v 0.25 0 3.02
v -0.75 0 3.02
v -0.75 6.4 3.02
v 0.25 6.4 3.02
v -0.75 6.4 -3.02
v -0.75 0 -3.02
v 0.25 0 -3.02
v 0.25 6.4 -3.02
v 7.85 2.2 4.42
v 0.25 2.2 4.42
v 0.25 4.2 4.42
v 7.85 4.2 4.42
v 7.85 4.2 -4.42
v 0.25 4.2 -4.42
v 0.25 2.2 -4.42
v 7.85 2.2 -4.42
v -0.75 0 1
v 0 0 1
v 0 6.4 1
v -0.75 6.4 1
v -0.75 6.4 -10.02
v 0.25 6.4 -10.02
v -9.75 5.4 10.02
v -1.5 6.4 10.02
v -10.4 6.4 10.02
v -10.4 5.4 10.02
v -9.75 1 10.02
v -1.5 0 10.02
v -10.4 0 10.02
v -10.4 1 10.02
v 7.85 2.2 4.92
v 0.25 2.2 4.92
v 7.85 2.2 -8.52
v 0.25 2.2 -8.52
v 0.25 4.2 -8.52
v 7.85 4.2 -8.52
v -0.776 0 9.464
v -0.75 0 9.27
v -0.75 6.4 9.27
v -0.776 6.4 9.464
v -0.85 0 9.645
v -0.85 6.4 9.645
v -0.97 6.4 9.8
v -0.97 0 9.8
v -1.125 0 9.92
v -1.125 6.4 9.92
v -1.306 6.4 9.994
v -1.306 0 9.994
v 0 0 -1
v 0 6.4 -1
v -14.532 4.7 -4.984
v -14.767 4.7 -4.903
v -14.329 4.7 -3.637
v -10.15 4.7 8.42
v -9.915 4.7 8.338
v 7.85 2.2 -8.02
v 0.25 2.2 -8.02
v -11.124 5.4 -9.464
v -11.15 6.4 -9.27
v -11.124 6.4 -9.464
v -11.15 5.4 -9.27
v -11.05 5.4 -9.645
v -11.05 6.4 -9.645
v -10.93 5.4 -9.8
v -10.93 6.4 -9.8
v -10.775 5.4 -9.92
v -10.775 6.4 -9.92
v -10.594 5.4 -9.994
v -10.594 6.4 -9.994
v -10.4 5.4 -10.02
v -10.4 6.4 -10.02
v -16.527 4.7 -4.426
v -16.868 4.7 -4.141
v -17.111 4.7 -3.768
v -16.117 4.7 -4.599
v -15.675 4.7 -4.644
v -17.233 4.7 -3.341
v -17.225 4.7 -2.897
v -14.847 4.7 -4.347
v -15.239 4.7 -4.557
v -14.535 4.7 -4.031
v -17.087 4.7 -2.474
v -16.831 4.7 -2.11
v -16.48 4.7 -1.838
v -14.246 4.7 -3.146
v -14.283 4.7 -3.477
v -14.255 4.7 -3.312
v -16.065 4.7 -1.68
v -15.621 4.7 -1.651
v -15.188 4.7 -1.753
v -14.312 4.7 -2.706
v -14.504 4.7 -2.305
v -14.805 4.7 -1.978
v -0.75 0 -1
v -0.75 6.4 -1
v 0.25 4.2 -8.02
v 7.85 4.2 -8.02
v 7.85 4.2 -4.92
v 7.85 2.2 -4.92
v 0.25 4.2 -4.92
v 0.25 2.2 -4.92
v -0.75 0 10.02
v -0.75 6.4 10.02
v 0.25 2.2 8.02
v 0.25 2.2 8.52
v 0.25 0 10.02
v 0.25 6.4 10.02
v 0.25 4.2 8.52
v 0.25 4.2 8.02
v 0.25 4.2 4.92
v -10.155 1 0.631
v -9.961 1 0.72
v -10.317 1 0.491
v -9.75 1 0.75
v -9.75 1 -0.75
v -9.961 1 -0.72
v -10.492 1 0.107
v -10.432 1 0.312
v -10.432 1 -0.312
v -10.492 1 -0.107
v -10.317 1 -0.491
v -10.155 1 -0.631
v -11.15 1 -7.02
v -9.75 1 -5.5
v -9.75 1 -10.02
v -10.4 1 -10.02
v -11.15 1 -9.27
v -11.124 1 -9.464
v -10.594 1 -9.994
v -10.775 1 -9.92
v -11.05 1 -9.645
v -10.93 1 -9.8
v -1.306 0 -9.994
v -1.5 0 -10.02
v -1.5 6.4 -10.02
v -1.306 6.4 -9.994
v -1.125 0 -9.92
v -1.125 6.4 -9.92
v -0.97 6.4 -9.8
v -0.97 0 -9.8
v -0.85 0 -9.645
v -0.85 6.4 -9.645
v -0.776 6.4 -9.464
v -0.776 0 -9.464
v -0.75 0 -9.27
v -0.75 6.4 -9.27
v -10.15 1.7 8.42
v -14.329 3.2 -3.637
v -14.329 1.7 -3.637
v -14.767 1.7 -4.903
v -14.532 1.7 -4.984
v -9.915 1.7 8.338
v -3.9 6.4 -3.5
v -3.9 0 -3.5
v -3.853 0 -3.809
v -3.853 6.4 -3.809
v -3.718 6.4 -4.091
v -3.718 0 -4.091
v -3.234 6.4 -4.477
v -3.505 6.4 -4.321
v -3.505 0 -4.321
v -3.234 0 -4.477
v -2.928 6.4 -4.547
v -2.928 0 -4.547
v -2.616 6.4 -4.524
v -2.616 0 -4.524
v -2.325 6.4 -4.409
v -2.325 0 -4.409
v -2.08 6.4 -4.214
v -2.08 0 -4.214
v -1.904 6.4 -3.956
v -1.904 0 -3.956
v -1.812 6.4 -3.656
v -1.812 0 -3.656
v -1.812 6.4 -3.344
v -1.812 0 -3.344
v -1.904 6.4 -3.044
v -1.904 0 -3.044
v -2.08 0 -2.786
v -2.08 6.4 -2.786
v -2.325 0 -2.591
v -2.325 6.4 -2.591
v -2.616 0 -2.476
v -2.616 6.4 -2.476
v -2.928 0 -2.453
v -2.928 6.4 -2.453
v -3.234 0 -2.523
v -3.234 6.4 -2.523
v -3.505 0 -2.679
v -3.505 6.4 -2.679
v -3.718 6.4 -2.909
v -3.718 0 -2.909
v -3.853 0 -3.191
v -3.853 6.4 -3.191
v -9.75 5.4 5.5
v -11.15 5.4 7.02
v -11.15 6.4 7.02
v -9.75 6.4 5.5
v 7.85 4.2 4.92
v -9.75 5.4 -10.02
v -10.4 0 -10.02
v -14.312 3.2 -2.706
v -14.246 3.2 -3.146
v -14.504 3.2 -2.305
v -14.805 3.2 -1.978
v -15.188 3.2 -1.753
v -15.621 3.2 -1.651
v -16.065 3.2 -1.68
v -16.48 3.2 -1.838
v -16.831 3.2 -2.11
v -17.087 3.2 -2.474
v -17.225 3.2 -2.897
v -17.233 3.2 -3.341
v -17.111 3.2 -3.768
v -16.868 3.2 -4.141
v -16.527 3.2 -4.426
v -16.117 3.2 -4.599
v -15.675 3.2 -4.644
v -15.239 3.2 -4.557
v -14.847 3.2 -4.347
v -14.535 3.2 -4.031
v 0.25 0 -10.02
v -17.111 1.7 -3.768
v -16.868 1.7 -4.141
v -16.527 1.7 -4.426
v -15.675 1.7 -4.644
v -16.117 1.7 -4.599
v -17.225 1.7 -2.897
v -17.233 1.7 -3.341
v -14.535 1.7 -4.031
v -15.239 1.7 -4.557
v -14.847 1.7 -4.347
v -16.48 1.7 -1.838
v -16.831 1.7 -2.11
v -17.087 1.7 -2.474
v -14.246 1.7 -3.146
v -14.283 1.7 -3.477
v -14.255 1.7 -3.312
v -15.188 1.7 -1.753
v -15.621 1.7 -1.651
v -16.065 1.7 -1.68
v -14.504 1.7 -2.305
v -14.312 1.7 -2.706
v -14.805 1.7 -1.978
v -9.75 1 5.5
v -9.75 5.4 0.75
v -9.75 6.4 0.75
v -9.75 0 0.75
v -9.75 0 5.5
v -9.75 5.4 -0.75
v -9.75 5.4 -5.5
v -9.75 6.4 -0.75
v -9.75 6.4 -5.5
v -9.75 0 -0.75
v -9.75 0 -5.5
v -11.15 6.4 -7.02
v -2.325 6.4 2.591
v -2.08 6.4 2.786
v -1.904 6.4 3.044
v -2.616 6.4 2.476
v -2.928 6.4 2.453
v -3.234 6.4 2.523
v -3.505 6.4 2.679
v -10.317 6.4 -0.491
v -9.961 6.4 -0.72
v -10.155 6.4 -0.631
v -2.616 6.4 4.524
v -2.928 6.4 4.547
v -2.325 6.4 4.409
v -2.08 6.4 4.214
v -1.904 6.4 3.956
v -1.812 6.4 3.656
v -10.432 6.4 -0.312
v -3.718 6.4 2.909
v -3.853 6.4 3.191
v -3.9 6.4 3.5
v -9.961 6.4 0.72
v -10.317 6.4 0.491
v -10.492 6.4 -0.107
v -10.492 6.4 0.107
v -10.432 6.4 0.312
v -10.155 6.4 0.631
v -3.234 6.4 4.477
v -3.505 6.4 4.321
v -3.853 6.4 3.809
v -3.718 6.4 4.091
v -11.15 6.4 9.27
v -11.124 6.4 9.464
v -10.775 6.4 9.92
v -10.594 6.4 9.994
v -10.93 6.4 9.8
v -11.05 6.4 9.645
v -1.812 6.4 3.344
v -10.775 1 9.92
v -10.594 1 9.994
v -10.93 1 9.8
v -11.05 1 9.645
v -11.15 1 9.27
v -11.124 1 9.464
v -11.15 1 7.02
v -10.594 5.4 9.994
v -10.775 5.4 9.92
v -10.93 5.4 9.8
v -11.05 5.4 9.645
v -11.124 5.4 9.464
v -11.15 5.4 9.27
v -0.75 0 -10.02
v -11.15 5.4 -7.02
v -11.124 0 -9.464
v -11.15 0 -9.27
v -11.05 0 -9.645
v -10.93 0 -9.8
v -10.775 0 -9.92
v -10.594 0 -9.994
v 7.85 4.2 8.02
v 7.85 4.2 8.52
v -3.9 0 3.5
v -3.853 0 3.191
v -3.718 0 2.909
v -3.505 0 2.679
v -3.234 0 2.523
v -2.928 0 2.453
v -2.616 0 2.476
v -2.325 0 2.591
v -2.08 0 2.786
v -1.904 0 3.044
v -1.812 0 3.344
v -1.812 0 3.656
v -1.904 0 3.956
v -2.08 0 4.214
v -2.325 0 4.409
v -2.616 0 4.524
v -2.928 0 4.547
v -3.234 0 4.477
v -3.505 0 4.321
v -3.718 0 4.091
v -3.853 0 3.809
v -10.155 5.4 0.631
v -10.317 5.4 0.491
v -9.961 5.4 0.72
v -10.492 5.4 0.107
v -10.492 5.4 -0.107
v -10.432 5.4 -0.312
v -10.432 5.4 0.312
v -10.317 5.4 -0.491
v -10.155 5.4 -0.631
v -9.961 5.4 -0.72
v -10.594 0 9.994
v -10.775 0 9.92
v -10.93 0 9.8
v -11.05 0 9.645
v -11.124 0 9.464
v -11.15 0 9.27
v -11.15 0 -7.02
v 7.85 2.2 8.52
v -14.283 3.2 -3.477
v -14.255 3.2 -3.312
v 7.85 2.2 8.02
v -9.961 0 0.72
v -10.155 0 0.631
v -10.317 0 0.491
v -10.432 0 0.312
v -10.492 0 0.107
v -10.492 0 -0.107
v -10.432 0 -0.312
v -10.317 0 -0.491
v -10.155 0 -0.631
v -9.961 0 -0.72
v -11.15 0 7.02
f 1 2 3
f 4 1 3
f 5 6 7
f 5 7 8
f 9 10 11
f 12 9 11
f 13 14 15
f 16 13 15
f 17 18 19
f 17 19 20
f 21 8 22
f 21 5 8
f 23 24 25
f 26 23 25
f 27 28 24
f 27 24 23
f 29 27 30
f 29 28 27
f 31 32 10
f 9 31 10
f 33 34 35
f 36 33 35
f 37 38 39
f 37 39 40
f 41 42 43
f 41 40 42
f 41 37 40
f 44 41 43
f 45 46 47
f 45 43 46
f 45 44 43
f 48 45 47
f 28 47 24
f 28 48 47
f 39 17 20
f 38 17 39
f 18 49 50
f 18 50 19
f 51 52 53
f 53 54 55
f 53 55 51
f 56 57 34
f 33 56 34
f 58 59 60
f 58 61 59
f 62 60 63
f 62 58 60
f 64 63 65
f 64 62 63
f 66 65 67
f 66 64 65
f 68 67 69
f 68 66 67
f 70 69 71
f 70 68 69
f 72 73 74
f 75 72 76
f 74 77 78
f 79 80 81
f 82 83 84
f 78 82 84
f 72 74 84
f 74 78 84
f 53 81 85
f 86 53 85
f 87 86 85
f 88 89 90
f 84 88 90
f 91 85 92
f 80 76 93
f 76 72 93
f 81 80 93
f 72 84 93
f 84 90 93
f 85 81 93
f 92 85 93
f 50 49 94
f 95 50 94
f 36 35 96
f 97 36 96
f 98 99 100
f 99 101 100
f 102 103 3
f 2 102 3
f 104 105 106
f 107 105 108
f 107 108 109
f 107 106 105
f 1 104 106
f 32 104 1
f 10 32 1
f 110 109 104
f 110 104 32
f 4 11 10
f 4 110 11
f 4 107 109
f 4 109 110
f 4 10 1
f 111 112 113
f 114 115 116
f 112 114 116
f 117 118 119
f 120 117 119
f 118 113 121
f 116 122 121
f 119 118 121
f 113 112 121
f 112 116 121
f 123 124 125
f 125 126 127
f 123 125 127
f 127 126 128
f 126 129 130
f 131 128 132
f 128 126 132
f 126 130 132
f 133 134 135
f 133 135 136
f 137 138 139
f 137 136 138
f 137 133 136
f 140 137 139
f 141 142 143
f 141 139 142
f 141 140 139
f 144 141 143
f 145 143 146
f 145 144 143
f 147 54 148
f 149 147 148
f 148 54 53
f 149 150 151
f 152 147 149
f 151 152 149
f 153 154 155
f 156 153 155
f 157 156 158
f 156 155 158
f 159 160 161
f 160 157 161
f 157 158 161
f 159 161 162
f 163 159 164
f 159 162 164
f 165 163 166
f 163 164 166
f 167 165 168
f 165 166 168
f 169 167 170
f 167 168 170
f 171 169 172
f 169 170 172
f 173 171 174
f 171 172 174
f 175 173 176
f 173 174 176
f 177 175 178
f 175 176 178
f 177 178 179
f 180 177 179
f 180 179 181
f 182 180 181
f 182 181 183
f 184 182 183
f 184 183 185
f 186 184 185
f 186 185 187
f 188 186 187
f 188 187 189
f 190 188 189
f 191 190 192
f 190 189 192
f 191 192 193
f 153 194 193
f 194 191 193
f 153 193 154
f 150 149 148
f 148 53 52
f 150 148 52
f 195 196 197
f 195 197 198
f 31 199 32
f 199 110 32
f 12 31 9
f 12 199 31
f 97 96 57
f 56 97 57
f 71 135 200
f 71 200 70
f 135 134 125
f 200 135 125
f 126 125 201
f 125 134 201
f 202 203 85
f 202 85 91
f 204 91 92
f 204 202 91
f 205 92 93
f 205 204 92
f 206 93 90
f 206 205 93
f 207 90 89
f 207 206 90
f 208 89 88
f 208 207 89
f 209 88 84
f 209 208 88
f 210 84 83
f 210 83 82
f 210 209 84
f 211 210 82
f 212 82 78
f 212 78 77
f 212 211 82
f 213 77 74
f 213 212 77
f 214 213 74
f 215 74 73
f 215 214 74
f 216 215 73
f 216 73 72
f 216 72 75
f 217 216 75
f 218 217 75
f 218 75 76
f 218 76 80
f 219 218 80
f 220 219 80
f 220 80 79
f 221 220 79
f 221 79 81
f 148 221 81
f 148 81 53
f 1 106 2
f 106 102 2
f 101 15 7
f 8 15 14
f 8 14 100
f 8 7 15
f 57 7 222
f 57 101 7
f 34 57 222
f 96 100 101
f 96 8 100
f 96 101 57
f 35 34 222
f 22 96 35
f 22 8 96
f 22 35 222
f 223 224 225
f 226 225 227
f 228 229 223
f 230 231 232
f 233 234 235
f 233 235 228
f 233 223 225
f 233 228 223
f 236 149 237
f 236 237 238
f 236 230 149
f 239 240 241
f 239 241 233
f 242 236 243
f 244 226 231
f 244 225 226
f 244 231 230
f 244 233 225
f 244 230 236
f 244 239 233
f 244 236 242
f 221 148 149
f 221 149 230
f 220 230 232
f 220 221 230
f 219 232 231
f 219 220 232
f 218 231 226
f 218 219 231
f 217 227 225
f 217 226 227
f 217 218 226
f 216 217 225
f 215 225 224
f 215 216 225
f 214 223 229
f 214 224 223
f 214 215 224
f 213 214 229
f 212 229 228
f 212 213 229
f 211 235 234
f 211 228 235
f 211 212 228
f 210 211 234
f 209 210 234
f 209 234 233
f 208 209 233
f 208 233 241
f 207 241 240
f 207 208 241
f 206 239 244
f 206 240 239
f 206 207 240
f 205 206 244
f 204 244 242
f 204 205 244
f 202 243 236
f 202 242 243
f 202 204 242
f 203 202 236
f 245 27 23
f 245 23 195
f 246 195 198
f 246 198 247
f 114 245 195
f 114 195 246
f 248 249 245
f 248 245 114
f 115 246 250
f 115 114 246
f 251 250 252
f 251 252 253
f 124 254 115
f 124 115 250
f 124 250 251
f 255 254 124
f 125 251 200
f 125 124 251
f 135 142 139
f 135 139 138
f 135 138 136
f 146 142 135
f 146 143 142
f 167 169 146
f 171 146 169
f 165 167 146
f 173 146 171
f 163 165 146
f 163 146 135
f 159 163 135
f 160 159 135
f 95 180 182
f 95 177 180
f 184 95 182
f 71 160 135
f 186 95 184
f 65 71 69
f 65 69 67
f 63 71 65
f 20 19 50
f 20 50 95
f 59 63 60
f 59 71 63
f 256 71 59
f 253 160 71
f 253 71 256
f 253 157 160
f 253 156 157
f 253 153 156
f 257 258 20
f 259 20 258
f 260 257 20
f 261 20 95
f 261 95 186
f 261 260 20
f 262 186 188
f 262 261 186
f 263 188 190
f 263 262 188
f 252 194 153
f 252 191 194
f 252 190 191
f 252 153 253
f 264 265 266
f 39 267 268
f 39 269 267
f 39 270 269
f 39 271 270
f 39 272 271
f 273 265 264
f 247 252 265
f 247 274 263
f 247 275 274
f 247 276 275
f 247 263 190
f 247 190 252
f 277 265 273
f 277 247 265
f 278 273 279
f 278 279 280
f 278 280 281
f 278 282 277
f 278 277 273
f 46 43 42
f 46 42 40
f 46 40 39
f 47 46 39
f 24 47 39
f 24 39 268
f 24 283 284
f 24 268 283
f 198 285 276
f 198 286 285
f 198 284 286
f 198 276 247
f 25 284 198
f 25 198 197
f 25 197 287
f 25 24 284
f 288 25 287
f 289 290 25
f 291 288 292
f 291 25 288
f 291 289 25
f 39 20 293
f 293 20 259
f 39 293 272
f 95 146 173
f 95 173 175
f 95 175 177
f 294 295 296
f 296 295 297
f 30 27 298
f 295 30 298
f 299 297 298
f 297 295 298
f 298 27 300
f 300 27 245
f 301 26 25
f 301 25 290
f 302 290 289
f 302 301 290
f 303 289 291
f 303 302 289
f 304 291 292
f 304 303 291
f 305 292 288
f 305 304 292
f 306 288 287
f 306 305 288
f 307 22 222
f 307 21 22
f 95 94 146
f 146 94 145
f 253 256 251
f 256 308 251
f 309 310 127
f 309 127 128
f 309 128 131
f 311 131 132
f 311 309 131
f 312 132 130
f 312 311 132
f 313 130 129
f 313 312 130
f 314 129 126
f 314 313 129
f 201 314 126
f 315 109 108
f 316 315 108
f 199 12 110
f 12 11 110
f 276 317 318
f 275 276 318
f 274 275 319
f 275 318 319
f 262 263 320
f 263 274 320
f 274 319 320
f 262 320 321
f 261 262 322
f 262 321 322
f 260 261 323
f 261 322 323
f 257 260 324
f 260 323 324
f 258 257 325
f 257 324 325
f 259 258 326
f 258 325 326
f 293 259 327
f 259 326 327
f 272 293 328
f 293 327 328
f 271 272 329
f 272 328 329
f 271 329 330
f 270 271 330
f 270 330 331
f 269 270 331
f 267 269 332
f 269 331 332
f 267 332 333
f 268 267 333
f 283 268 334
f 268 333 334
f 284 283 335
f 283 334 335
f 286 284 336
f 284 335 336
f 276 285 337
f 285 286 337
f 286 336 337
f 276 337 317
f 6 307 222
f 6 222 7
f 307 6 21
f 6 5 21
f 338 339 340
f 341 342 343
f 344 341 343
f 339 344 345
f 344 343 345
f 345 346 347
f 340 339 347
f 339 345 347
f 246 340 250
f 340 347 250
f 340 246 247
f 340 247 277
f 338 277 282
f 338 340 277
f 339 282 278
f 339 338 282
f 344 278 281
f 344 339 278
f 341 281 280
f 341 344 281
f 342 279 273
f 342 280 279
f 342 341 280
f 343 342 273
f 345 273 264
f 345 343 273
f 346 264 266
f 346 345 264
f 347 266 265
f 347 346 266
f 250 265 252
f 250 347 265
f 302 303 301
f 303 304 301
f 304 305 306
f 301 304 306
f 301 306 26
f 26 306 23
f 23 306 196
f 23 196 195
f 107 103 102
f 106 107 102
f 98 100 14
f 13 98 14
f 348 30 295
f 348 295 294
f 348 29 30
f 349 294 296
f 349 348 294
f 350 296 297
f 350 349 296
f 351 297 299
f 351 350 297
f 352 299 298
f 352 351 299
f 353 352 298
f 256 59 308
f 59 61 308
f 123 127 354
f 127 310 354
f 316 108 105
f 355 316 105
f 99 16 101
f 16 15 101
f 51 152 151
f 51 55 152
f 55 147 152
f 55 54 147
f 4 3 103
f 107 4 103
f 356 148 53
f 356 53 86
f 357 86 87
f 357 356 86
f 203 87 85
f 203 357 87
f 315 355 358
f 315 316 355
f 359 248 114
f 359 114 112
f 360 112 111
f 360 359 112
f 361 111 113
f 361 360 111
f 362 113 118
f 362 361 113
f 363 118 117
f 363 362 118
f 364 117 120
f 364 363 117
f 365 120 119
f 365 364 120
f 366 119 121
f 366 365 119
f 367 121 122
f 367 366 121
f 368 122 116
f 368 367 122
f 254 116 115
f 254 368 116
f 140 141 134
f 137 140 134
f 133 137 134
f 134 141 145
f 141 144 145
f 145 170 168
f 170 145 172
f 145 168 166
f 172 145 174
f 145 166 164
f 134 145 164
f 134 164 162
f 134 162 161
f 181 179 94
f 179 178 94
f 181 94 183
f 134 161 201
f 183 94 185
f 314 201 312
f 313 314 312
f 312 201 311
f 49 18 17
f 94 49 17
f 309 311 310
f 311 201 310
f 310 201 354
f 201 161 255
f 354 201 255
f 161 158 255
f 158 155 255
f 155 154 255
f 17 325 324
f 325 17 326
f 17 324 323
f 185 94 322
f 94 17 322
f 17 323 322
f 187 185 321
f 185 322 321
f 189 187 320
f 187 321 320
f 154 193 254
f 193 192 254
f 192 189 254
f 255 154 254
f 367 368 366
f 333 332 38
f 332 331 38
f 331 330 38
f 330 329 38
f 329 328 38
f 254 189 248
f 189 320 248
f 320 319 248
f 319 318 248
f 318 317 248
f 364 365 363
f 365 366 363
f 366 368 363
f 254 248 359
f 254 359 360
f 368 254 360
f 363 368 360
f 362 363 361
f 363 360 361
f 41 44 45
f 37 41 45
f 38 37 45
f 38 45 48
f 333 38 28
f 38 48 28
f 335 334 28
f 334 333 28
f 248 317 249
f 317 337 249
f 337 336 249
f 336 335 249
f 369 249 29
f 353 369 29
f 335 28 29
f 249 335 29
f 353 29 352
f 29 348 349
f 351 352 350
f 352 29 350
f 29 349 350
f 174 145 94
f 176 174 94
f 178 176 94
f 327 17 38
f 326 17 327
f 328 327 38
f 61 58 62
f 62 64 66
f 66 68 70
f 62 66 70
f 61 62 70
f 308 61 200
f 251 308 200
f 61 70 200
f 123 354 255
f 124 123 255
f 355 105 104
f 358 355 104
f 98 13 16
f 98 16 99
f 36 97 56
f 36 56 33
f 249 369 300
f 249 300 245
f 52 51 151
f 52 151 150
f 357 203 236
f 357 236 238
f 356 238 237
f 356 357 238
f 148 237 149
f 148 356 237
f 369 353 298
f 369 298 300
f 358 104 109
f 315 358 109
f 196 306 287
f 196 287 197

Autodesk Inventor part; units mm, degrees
ref_plane "YZ Plane" through (0, 0, 0) normal (1, 0, 0) x (0, 1, 0)
ref_plane "XZ Plane" through (0, 0, 0) normal (0, 1, 0) x (-1, 0, 0)
ref_plane "XY Plane" through (0, 0, 0) normal (0, 0, 1) x (1, 0, 0)
sketch "Sketch1" plane through (0, 0, 0) normal (0, 1, 0) x (-1, 0, 0)
  line L0 (0, 0) -> (0, 1)
  line L1 (0, 1) -> (0.75, 1)
  line L2 (0.75, 1) -> (0.75, 9.27)
  line L3 (1.5, 10.02) -> (10.4, 10.02)
  line L4 (11.15, 9.27) -> (11.15, 7.02)
  line L5 (11.15, 7.02) -> (9.75, 5.5)
  line L6 (9.75, 5.5) -> (9.75, 0.75)
  arc A0 (10.5, 0) -> (9.75, 0.75) centre (9.75, 0) ccw
  line L7 (9.75, 0) -> (9.75, 0.75) construction
  circle A1 centre (2.85, 3.5) radius 1.05
  line L8 (9.75, 0) -> (9.25, 0) construction
  line L9 (0, 0) -> (9.25, 0) construction
  line L10 (9.75, 7.7) -> (9.75, 5.5) construction
  arc A2 (11.15, 9.27) -> (10.4, 10.02) centre (10.4, 9.27) ccw
  arc A3 (1.5, 10.02) -> (0.75, 9.27) centre (1.5, 9.27) ccw
  line L11 (9.75, 0) -> (10.5, 0) construction
  line L12 (0, 0) -> (0, -1)
  line L13 (0, -1) -> (0.75, -1)
  line L14 (0.75, -1) -> (0.75, -9.27)
  line L15 (1.5, -10.02) -> (10.4, -10.02)
  line L16 (11.15, -9.27) -> (11.15, -7.02)
  line L17 (11.15, -7.02) -> (9.75, -5.5)
  line L18 (9.75, -5.5) -> (9.75, -0.75)
  arc A4 (9.75, -0.75) -> (10.5, 0) centre (9.75, 0) ccw
  line L19 (9.75, 0) -> (9.75, -0.75) construction
  circle A5 centre (2.85, -3.5) radius 1.05
  line L20 (9.75, -7.7) -> (9.75, -5.5) construction
  arc A6 (10.4, -10.02) -> (11.15, -9.27) centre (10.4, -9.27) ccw
  arc A7 (0.75, -9.27) -> (1.5, -10.02) centre (1.5, -9.27) ccw
  point P0 (11.15, 10.02)
  point P1 (11.15, -10.02)
  dimension "d0" = 0.75
  dimension "d1" = 2.1
  dimension "d2" = 3.5
  dimension "d3" = 10.02
  dimension "d4" = 3
  dimension "d5" = 0.75
  dimension "d6" = 2.1
  dimension "d7" = 1
  dimension "d8" = 6.9
  dimension "d9" = 8.3
  dimension "d10" = 4.2
  dimension "d11" = 5.5
  dimension "d12" = 0.75
extrude "Extrusion1" add sketch "Sketch1" along normal blind 6.4
sketch "Sketch2" plane through (-0.75, 0, 9.27) normal (1, 0, 0) x (0, 0, -1)
  line L0 (-0.75, 0) -> (0, 0) projected
  line L1 (8.52, 6.4) -> (3.77, 6.4) construction
  line L2 (-0.75, 0) -> (6.25, 0)
  line L3 (6.25, 0) -> (6.25, 6.4)
  line L4 (6.25, 6.4) -> (-0.75, 6.4)
  line L5 (-0.75, 6.4) -> (-0.75, 0)
  line L6 (8.27, 6.4) -> (10.27, 6.4) construction
  line L7 (9.27, 6.4) -> (9.27, 0) construction
  line L8 (19.29, 0) -> (18.54, 0)
  line L9 (19.29, 0) -> (12.29, 0)
  line L10 (12.29, 0) -> (12.29, 6.4)
  line L11 (12.29, 6.4) -> (19.29, 6.4)
  line L12 (19.29, 6.4) -> (19.29, 0)
  point P0 (14.77, 6.4)
  dimension "d15" = 7
extrude "Extrusion2" add sketch "Sketch2" along normal blind 1 separate body
sketch "Sketch3" plane through (0.25, 0, 9.27) normal (1, 0, 0) x (0, 0, -1)
  line L0 (0.75, 2.2) -> (1.25, 2.2)
  line L1 (1.25, 2.2) -> (1.25, 4.2)
  line L2 (1.25, 4.2) -> (0.75, 4.2)
  line L3 (0.75, 4.2) -> (0.75, 2.2)
  line L4 (0.75, 2.2) -> (1.25, 4.2) construction
  line L5 (1.25, 2.2) -> (0.75, 4.2) construction
  line L6 (4.35, 2.2) -> (4.85, 2.2)
  line L7 (4.85, 2.2) -> (4.85, 4.2)
  line L8 (4.85, 4.2) -> (4.35, 4.2)
  line L9 (4.35, 4.2) -> (4.35, 2.2)
  line L10 (4.35, 2.2) -> (4.85, 4.2) construction
  line L11 (4.85, 2.2) -> (4.35, 4.2) construction
  line L12 (1, 3.2) -> (4.6, 3.2) construction
  line L13 (-0.75, 0) -> (-0.75, 6.4) construction
  line L14 (-0.75, 3.2) -> (1, 3.2) construction
  point P0 (9.27, 0)
  dimension "d18" = 0.5
  dimension "d19" = 2
  dimension "d21" = 3.6
  dimension "d22" = 1.75
extrude "Extrusion3" add sketch "Sketch3" along normal blind 7.6 bodies 2
mirror "Mirror1" about plane through (0, 0, 0) normal (0, 0, 1) of "Extrusion3" bodies 2
sketch "Sketch4" plane through (-1.5, 0, -10.02) normal (0, 0, -1) x (-1, 0, 0)
  line L0 (9.65, 0) -> (9.65, 6.4) construction
  line L1 (9.65, 5.4) -> (8.25, 5.4)
  line L2 (8.25, 5.4) -> (8.25, 1)
  line L3 (8.25, 1) -> (9.65, 1)
  line L4 (9.65, 1) -> (9.65, 5.4)
  line L5 (8.25, 0) -> (8.25, 6.4) construction
  point P0 (-1.5, 0)
  dimension "d25" = 1
  dimension "d26" = 1
extrude "Extrusion4" cut sketch "Sketch4" against normal through all bodies 1
sketch "Sketch5" plane through (0, 0, 0) normal (0, 1, 0) x (-1, 0, 0)
  point P0 (0, 0)
ref_plane "Work Plane1" through (-9.75, 3.2, 10.02) normal (0, -1, 0) x (1, 0, 0)
sketch "Sketch6" plane through (-9.75, 3.2, 10.02) normal (0, -1, 0) x (1, 0, 0)
  line L0 (-0.4, -1.6) -> (-5.0173, -14.9226)
  circle A0 centre (-5.9959, -13.1657) radius 1.5
  line L1 (0, -4.52) -> (0, 0) construction
  line L2 (-0.4, -1.6) -> (-0.1647, -1.6816)
  line L3 (-0.1647, -1.6816) -> (-4.7819, -15.0041)
  line L4 (-4.7819, -15.0041) -> (-5.0173, -14.9226)
  point P0 (9.75, -10.02)
  dimension "d29" = 14.1
  dimension "d30" = 0.4
  dimension "d31" = 1.6
  dimension "d32" = 3
extrude "Extrusion5" add sketch "Sketch6" along normal mid plane 3 separate body
equation "\"d26\" = d25"
properties part number "CH_01_0025_end_switch"
